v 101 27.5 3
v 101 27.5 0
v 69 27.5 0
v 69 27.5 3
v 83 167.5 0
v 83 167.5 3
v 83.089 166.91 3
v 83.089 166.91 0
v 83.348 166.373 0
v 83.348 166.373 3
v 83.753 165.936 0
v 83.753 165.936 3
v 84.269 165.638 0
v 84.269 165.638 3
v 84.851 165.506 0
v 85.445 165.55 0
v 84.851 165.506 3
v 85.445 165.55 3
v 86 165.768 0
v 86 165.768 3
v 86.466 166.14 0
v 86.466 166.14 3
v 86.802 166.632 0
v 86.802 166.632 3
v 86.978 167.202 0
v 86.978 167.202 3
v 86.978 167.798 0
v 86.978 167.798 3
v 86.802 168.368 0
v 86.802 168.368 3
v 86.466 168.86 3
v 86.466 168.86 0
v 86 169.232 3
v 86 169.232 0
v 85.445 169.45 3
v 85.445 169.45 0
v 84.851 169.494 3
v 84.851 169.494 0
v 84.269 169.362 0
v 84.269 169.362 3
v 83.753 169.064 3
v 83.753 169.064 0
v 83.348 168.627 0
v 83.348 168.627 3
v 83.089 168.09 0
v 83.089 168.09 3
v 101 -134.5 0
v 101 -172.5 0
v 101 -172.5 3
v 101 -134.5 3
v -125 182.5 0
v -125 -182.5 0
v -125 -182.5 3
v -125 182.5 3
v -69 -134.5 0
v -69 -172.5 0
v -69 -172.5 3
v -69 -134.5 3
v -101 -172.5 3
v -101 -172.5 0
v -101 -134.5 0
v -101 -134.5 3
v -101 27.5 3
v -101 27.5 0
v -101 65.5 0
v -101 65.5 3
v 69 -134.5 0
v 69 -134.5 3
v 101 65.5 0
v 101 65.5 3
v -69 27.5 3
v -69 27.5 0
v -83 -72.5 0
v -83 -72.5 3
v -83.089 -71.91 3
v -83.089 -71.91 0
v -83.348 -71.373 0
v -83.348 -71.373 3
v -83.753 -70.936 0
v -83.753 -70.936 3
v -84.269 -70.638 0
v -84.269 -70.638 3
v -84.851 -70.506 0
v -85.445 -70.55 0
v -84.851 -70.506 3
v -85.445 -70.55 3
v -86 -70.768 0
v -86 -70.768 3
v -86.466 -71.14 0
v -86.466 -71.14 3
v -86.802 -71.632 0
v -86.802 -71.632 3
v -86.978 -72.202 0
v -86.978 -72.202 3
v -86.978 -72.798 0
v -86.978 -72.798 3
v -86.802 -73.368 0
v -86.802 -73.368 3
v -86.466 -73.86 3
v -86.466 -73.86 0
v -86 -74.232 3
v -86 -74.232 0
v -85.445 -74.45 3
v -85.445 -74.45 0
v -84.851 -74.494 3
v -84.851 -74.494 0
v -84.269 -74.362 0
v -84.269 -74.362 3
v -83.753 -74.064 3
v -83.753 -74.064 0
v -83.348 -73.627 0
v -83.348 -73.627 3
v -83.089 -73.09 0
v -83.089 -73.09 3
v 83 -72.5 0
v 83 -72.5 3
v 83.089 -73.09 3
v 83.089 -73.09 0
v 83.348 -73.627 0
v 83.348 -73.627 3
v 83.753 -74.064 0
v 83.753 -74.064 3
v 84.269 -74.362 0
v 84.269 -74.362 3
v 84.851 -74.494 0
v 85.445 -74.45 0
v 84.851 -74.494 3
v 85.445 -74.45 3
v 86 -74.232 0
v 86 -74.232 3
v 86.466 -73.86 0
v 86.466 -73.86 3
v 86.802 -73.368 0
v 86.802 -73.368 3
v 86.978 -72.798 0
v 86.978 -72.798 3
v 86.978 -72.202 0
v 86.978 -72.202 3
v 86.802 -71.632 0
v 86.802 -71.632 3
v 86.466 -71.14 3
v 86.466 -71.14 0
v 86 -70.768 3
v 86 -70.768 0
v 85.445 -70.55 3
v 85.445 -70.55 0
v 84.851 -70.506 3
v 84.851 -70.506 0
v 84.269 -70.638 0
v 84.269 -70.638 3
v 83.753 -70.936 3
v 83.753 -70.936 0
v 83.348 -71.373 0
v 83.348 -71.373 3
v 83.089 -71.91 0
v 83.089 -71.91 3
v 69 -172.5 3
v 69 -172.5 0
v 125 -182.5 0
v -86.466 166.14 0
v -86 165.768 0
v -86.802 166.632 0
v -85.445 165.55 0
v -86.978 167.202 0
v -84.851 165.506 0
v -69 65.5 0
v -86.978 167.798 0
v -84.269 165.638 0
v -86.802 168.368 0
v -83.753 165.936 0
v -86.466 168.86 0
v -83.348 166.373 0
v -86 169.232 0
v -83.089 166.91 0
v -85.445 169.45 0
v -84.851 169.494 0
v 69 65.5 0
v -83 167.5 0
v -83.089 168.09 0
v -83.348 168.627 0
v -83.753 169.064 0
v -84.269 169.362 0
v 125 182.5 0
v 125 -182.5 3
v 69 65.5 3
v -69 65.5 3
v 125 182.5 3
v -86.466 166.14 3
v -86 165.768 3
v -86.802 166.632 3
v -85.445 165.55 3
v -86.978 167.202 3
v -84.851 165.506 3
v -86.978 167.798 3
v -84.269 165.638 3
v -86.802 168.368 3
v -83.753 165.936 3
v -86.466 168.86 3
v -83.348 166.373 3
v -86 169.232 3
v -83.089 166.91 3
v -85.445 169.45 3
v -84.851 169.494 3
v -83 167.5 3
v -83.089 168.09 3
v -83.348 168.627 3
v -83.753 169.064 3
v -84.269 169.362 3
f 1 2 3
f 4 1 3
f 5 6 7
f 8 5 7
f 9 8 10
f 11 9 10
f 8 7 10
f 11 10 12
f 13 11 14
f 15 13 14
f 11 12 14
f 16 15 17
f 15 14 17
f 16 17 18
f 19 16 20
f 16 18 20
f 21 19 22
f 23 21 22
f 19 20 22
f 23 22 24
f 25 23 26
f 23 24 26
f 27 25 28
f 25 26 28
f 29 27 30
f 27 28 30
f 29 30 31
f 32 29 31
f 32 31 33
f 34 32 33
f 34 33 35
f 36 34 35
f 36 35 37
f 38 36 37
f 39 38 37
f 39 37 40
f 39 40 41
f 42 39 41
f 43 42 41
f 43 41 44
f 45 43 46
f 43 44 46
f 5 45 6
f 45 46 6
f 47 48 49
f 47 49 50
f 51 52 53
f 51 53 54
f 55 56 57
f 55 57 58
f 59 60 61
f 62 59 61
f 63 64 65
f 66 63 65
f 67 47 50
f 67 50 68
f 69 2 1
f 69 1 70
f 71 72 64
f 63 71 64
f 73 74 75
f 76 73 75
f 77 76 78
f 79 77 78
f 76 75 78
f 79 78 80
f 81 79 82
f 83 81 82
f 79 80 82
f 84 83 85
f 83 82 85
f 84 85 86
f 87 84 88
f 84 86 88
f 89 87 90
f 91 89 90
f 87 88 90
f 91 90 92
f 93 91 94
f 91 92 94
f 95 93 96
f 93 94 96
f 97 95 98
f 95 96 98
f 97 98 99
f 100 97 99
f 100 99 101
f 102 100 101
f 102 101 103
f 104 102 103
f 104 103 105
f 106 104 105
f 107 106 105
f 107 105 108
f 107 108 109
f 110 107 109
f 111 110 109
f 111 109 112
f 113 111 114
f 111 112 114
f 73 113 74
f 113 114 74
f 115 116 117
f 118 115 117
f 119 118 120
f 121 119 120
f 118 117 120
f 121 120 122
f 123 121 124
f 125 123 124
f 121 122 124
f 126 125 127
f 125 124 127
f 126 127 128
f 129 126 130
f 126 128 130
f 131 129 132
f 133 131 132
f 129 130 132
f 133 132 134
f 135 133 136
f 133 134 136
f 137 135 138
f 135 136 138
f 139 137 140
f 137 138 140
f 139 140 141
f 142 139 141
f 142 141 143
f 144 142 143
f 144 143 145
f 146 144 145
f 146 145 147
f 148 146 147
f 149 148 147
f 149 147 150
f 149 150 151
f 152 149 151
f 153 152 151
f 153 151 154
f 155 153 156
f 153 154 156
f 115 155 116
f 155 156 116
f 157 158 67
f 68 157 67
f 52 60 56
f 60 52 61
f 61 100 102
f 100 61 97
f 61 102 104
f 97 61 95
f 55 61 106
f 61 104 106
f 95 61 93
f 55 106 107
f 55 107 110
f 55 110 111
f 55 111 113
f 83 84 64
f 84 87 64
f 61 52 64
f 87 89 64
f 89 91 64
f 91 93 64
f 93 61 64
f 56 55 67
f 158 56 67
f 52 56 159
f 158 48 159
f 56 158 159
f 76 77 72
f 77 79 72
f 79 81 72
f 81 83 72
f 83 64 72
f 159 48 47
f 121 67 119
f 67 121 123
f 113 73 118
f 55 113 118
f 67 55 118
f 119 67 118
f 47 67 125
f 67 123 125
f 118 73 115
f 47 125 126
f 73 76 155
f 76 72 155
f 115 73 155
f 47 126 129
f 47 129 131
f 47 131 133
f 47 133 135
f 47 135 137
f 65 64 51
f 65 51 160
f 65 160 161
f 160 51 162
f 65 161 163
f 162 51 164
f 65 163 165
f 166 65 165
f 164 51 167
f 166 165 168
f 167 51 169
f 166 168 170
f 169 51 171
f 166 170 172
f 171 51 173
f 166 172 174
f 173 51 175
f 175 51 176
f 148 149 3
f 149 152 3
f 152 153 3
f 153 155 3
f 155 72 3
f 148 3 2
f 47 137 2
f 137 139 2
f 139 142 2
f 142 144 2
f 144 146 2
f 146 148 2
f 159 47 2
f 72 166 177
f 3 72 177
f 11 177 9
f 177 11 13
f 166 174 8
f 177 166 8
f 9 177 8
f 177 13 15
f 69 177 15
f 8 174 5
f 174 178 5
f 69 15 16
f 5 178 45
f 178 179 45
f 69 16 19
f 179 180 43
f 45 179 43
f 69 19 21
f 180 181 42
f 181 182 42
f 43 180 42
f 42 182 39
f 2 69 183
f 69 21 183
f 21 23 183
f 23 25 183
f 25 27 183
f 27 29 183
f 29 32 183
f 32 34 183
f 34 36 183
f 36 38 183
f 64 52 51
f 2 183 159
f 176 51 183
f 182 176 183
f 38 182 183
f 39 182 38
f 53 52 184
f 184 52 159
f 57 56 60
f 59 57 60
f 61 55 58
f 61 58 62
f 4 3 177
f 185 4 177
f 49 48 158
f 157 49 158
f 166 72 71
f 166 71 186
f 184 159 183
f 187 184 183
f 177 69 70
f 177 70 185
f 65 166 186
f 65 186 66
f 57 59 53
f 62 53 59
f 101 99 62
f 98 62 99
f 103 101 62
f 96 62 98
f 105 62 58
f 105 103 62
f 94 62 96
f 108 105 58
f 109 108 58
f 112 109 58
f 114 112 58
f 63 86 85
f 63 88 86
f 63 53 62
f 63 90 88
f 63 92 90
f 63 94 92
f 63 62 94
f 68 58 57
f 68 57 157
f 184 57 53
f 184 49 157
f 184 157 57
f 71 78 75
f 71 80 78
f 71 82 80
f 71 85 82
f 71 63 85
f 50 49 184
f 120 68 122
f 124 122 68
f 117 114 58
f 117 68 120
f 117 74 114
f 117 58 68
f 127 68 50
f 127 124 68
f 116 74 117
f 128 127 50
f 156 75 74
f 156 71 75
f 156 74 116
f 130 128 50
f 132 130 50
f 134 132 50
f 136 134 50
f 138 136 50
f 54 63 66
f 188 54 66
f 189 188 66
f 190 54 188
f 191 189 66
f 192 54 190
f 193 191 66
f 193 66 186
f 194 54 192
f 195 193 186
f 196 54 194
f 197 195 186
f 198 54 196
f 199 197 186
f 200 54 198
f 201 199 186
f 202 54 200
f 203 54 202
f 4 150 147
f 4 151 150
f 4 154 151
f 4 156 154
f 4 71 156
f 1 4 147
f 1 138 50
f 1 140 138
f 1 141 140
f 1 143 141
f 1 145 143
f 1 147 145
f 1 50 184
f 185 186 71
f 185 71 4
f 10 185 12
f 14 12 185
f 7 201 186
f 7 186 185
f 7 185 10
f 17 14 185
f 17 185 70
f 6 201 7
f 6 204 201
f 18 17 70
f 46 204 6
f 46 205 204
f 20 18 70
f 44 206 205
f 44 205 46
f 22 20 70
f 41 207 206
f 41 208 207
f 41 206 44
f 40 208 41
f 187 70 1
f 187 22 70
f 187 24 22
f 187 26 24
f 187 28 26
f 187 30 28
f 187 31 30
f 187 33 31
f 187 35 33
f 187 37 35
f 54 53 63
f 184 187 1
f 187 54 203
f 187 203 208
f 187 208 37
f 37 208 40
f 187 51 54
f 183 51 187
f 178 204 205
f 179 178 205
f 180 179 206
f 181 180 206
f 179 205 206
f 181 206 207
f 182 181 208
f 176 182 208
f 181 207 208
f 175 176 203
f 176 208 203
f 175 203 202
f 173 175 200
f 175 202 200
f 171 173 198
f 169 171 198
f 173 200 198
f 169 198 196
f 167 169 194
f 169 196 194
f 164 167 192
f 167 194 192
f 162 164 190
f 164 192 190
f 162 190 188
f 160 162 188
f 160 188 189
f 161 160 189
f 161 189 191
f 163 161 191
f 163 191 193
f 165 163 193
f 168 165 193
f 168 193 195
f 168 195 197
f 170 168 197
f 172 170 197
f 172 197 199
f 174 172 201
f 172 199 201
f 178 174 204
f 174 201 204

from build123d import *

# Parameters (mm, degrees)
SKETCH1_W           = 250
SKETCH1_H           = 365
BOSS_EXTRUDE1_DEPTH = 3
SKETCH3_R           = 2
CUT_EXTRUDE2_DEPTH  = 3
SKETCH4_W           = 32
SKETCH4_H           = 38
CUT_EXTRUDE3_DEPTH  = 10


with BuildPart() as part:
    # Sketch1 → Boss-Extrude1 (new body)
    with BuildSketch(Plane.XY):
        Rectangle(SKETCH1_W, SKETCH1_H)
    extrude(amount=BOSS_EXTRUDE1_DEPTH)

    # Sketch3 → Cut-Extrude2 (cut)
    with BuildSketch(Plane.XY.offset(3)):
        with Locations((-85, 167.5)):
            Circle(SKETCH3_R)
        with Locations((-85, 47.5)):
            Circle(SKETCH3_R)
        with Locations((-85, -72.5)):
            Circle(SKETCH3_R)
        with Locations((-85, -192.5)):
            Circle(SKETCH3_R)
        with Locations((85, -192.5)):
            Circle(SKETCH3_R)
        with Locations(Location((85, -72.5, 0), (0, 0, 180))):
            Circle(SKETCH3_R)
        with Locations(Location((85, 47.5, 0), (0, 0, 180))):
            Circle(SKETCH3_R)
        with Locations(Location((85, 167.5, 0), (0, 0, 180))):
            Circle(SKETCH3_R)
    extrude(amount=-CUT_EXTRUDE2_DEPTH, mode=Mode.SUBTRACT)

    # Sketch4 → Cut-Extrude3 (cut)
    with BuildSketch(Plane(origin=(0, 0, 0), x_dir=(-1, 0, 0), z_dir=(0, 0, -1))):
        with Locations((-85, -153.5)):
            Rectangle(SKETCH4_W, SKETCH4_H)
        with Locations((85, -153.5)):
            Rectangle(SKETCH4_W, SKETCH4_H)
        with Locations((-85, 46.5)):
            Rectangle(SKETCH4_W, SKETCH4_H)
        with Locations((85, 46.5)):
            Rectangle(SKETCH4_W, SKETCH4_H)
    extrude(amount=-CUT_EXTRUDE3_DEPTH, mode=Mode.SUBTRACT)


solid = part.part
